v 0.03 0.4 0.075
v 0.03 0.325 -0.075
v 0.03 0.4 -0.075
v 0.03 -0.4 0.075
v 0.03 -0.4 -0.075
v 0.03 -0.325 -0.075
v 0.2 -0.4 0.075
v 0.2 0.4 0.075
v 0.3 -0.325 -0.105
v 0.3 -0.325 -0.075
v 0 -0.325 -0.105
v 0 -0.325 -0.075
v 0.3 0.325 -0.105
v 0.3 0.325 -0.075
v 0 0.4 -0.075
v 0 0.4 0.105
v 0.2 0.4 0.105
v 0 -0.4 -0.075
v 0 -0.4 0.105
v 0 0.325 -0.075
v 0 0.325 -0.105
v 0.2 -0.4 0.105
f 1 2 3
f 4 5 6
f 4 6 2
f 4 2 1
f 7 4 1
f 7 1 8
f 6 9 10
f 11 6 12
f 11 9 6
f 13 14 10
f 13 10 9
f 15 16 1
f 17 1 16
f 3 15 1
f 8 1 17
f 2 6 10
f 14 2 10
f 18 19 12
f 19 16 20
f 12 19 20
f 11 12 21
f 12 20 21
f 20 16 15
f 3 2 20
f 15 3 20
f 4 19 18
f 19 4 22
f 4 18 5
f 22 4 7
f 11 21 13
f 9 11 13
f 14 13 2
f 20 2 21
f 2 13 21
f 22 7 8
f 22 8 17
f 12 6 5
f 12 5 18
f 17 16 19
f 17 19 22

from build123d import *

# Parameters (mm, degrees)
SKETCH1_W           = 0.3
SKETCH1_H           = 0.21
BOSS_EXTRUDE1_DEPTH = 0.4
SKETCH2_W           = 0.27
SKETCH2_H           = 0.15
CUT_EXTRUDE1_DEPTH  = 1.8
SKETCH3_W           = 0.1
SKETCH3_H           = 0.03
CUT_EXTRUDE2_DEPTH  = 1.8
SKETCH4_W           = 0.3
SKETCH4_H           = 0.075
CUT_EXTRUDE3_DEPTH  = 0.03


with BuildPart() as part:
    # Sketch1 → Boss-Extrude1 (new body, symmetric)
    with BuildSketch(Plane(origin=(0, 0, 0), x_dir=(1, 0, 0), z_dir=(0, 1, 0))):
        with Locations((0.15, 0)):
            Rectangle(SKETCH1_W, SKETCH1_H)
    extrude(amount=BOSS_EXTRUDE1_DEPTH, both=True)

    # Sketch2 → Cut-Extrude1 (cut, through all)
    with BuildSketch(Plane.XZ.offset(0.4)):
        with Locations((0.165, 0)):
            Rectangle(SKETCH2_W, SKETCH2_H)
    extrude(amount=-CUT_EXTRUDE1_DEPTH, mode=Mode.SUBTRACT)

    # Sketch3 → Cut-Extrude2 (cut, through all)
    with BuildSketch(Plane.XZ.offset(0.4)):
        with Locations((0.25, 0.09)):
            Rectangle(SKETCH3_W, SKETCH3_H)
    extrude(amount=-CUT_EXTRUDE2_DEPTH, mode=Mode.SUBTRACT)

    # Sketch4 → Cut-Extrude3 (cut)
    with BuildSketch(Plane(origin=(0, 0, -0.105), x_dir=(-1, 0, 0), z_dir=(0, 0, -1))):
        with Locations((-0.15, -0.3625)):
            Rectangle(SKETCH4_W, SKETCH4_H)
    cut_extrude3 = extrude(amount=-CUT_EXTRUDE3_DEPTH, mode=Mode.SUBTRACT)

    # Mirror1: Cut-Extrude3 across plane
    add(cut_extrude3.mirror(Plane.ZX), mode=Mode.SUBTRACT)


solid = part.part
